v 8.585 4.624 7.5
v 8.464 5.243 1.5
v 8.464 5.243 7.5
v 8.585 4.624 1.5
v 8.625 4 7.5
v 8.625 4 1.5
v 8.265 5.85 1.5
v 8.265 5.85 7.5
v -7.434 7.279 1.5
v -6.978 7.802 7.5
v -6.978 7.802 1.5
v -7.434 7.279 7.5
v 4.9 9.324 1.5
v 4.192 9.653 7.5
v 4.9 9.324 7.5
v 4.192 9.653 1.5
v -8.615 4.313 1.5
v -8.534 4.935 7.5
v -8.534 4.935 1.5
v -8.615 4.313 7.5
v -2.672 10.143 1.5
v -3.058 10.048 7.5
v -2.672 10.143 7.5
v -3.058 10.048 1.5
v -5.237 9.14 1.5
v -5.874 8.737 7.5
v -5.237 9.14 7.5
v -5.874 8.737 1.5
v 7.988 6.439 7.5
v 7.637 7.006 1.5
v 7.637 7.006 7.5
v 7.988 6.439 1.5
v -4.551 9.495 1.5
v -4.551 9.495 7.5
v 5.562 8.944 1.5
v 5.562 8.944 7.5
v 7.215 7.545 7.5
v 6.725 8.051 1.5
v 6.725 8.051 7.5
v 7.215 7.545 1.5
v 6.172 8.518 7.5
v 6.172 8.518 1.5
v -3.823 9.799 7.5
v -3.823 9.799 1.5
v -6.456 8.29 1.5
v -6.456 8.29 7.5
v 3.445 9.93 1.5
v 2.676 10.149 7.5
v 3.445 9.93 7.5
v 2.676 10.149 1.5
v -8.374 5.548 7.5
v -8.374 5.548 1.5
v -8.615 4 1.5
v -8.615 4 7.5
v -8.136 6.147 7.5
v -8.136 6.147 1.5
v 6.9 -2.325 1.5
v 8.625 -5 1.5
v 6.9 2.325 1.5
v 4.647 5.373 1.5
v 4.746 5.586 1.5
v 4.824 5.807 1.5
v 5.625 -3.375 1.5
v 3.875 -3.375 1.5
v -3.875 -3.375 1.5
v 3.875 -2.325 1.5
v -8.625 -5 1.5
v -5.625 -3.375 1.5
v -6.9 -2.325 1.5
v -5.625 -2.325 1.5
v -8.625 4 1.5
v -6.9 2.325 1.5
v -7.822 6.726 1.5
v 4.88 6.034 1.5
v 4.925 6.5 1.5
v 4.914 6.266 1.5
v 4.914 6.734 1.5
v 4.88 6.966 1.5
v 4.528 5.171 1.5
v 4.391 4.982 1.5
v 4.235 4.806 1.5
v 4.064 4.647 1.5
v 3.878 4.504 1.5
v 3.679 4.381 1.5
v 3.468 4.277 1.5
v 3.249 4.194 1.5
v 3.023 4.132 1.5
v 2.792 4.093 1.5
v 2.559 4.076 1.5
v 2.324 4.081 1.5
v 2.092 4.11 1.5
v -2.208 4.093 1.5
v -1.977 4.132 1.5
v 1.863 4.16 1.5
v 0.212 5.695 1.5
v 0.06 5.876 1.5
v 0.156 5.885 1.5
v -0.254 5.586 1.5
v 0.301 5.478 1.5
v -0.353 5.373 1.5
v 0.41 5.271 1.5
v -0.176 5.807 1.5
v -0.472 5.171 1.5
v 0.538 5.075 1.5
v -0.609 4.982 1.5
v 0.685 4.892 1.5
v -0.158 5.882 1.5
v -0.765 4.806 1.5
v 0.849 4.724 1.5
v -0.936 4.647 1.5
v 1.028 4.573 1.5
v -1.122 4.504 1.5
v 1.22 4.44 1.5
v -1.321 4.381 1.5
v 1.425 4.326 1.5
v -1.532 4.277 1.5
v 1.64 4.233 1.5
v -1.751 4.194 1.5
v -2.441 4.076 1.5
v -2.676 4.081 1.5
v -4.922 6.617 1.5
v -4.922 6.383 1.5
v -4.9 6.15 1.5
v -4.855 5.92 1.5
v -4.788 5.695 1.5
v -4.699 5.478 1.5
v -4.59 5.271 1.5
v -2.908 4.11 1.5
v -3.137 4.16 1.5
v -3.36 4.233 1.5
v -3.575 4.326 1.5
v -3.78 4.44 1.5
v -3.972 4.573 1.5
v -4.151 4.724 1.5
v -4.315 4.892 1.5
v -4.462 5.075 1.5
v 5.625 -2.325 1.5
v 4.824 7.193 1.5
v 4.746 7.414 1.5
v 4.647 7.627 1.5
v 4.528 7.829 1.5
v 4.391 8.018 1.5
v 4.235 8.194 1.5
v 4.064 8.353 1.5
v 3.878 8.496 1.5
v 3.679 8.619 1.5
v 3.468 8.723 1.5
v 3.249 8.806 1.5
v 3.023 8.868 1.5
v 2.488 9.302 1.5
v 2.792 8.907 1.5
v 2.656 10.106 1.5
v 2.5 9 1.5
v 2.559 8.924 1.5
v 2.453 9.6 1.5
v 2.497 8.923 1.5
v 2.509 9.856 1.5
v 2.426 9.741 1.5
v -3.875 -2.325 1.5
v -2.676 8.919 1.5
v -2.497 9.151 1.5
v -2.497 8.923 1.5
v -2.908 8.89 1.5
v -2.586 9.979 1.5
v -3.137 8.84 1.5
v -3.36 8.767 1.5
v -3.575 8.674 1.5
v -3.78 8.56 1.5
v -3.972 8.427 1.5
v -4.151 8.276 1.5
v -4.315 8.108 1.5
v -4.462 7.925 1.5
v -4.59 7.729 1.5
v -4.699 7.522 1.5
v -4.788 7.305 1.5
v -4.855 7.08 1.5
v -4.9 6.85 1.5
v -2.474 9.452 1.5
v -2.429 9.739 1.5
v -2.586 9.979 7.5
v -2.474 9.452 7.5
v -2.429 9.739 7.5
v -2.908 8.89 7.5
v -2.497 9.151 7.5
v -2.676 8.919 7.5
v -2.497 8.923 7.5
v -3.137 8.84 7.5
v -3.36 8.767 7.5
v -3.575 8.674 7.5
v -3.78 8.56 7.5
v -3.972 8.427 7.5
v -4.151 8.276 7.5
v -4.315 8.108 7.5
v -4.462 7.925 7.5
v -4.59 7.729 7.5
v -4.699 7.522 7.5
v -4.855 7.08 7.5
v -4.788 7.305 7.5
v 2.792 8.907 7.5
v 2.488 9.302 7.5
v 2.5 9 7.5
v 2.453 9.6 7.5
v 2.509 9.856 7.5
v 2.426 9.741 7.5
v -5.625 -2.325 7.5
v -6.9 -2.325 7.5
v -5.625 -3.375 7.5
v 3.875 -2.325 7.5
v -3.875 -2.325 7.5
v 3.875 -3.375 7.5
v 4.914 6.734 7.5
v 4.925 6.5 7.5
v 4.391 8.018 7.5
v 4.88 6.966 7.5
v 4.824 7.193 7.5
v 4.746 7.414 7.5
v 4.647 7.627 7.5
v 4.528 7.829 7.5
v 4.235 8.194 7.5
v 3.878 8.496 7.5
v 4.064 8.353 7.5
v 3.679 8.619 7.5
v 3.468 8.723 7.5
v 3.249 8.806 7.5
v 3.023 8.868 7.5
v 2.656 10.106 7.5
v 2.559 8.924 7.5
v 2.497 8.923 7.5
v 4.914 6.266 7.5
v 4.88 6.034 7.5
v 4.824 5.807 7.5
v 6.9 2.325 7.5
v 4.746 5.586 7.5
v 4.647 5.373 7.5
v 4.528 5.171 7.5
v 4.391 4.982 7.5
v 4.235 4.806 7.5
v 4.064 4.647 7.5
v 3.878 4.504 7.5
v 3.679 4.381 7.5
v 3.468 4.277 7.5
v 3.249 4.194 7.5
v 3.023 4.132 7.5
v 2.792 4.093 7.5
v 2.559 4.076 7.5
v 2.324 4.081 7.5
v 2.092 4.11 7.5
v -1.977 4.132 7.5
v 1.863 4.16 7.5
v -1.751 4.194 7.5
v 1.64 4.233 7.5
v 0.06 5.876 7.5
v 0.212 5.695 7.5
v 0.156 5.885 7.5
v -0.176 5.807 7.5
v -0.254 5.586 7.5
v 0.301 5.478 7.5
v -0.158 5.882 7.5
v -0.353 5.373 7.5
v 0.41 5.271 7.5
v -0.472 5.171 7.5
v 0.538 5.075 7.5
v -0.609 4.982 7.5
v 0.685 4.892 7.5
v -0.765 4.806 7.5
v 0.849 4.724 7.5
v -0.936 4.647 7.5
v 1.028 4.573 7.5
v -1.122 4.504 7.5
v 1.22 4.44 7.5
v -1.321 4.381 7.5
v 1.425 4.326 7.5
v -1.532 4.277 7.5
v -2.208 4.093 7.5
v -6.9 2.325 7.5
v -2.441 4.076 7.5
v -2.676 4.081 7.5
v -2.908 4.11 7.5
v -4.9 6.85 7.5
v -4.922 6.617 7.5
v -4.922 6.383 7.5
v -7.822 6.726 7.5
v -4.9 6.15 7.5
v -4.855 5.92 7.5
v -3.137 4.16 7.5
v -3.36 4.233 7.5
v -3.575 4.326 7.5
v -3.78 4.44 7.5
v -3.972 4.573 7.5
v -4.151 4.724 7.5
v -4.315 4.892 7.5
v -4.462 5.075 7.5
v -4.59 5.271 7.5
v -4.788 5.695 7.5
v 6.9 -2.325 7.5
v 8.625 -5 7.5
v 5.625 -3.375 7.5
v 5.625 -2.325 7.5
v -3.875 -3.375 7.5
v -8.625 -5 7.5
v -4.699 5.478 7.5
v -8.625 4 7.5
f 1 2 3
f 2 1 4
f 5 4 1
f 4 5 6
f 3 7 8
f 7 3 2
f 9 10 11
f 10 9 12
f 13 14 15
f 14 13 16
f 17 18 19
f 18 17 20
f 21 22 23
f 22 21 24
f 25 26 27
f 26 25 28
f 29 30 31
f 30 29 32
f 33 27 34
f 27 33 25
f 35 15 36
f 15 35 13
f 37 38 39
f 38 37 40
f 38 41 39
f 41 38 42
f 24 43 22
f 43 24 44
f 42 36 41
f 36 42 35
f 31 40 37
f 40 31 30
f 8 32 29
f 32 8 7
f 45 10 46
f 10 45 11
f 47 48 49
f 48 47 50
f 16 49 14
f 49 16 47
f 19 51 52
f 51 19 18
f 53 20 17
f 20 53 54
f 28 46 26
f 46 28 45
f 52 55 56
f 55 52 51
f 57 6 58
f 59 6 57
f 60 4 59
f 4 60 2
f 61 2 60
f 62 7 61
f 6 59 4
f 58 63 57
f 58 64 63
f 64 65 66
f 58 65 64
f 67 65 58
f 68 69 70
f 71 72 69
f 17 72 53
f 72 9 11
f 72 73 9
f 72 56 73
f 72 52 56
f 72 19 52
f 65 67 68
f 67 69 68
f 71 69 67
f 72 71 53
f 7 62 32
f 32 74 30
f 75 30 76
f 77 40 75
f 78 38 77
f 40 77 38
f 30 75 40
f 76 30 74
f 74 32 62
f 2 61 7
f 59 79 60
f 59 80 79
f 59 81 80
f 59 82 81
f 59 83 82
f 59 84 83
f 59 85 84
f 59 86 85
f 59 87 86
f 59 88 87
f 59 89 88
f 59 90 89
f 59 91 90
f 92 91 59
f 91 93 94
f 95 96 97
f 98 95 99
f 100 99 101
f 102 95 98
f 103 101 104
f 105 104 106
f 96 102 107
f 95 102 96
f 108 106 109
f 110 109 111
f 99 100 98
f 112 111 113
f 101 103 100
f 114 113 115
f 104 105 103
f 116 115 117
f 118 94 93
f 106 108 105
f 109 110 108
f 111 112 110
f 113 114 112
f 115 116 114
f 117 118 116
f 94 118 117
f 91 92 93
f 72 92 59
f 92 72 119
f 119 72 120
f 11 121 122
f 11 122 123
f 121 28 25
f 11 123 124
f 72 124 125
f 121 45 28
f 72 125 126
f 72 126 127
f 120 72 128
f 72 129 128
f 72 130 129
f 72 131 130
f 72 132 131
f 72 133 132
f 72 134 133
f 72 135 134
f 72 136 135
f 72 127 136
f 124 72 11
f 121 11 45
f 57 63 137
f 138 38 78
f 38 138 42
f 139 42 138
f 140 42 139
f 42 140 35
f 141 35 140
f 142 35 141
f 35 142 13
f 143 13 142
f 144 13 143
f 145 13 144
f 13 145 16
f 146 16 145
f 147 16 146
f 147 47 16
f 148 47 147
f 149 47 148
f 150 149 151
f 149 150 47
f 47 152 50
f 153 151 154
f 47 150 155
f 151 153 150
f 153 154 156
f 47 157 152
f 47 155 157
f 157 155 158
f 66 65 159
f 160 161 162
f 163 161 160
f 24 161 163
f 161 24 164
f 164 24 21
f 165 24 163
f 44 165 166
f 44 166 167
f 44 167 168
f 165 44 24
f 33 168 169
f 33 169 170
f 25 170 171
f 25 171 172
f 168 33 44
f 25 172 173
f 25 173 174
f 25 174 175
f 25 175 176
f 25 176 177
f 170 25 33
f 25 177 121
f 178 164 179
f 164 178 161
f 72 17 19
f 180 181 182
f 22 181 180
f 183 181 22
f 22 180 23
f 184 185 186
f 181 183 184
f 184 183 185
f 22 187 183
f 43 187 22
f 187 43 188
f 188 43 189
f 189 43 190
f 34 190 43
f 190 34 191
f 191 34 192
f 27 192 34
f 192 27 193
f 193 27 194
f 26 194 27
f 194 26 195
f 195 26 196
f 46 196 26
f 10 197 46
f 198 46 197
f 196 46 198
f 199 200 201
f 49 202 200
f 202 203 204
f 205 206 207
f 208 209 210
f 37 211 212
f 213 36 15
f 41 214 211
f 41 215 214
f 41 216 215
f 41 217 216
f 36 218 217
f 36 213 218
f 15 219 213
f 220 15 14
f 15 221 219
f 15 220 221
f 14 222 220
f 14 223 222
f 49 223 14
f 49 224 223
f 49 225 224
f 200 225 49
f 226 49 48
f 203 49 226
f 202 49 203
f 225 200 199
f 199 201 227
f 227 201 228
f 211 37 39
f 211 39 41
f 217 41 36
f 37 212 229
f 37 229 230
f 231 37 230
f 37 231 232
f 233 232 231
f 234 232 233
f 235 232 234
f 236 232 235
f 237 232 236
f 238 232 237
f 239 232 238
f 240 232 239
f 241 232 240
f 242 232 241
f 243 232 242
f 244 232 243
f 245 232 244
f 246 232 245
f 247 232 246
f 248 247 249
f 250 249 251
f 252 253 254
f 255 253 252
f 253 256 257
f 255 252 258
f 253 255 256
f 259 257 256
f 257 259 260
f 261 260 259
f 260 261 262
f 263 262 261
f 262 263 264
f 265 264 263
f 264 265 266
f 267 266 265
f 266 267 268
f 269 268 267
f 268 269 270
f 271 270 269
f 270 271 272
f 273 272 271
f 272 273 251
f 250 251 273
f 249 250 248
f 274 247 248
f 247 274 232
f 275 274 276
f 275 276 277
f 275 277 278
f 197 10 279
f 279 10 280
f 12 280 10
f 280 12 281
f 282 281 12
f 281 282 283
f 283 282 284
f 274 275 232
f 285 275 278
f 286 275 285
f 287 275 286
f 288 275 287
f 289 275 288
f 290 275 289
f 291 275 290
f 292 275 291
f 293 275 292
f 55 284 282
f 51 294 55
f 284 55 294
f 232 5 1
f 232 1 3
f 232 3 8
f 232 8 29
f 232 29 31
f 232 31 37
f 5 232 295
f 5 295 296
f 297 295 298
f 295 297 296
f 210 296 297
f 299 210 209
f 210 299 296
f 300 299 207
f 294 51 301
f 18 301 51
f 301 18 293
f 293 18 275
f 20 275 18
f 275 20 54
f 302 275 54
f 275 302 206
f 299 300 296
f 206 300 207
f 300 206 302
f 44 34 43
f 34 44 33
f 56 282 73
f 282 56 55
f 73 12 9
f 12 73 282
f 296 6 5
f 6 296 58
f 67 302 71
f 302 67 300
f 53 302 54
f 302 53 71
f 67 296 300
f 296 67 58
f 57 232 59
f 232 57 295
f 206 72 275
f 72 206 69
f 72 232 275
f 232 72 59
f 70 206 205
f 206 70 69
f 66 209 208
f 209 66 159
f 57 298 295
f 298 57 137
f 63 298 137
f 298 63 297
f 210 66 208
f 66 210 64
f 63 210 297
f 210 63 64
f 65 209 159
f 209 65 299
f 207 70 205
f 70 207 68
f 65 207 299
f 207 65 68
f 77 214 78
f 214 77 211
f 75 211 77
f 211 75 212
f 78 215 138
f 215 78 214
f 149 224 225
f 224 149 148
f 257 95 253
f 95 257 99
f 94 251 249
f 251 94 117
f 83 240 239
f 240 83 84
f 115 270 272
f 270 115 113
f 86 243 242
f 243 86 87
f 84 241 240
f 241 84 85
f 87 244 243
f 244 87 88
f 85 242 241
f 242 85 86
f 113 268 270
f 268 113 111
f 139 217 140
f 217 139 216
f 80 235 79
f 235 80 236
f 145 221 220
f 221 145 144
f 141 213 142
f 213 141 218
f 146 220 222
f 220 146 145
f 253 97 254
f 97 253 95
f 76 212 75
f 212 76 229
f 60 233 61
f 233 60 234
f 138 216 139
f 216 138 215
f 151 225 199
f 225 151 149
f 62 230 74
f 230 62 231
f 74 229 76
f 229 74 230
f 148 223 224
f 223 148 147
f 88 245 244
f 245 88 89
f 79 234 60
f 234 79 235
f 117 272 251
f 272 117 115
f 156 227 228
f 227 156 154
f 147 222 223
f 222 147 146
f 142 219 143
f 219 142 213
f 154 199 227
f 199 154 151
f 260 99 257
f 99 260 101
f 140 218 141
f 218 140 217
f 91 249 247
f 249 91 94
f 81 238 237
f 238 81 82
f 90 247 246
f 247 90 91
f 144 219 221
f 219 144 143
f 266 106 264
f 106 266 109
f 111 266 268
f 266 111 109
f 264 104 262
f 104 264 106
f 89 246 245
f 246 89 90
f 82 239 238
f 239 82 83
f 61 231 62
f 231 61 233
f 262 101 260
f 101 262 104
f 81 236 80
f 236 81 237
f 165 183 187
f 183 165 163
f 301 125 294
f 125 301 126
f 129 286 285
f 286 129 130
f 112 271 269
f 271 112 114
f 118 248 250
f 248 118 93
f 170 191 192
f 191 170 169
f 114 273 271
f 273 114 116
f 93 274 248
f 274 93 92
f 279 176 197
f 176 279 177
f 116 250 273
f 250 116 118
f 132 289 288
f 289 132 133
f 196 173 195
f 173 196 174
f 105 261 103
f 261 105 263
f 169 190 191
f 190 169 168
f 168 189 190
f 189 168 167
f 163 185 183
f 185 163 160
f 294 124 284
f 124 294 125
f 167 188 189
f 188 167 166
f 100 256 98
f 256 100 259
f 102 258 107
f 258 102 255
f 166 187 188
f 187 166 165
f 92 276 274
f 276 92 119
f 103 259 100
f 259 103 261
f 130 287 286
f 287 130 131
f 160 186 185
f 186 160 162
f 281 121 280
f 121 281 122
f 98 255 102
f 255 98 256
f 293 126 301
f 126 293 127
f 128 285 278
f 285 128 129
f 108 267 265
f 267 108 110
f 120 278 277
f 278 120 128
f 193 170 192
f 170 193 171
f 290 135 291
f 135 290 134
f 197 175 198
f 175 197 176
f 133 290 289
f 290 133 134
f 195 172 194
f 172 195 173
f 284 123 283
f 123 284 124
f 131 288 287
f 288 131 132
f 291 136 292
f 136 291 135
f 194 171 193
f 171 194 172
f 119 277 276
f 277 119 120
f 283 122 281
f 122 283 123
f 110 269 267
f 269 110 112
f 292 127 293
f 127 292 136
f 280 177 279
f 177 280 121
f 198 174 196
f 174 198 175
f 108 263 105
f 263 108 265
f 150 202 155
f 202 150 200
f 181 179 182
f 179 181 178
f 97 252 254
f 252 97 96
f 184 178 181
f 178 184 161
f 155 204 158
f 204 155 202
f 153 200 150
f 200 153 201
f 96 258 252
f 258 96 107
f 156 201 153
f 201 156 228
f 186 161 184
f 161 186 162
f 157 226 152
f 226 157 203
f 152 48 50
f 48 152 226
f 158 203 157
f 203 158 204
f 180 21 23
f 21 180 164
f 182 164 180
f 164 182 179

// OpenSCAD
cell_count = 4; // 3=3S, 4=4S, etc.

$fn=65;

show = "all"; // "all", "body", "jst", "holes", "cutout"

difference() {

    // body
    if (show=="body" || show=="all") {
        translate([0,0,0]) {
            translate([0,-0.5,4.5])
                cube([17.25,9,6], true);
            
            difference() {
                translate([0,4,4.5])
                    scale([1,0.75,1]) cylinder(h=6, d=17.25, center=true);
                translate([0,-17.25/2,4.5])
                    cube([17.25,17.25,6], true);
            }
            
        }
    }

    // JST-XH 5 (4S)
    if (show=="jst" || show=="all") {
        union() {
            translate([0,0,4.25])
                cube([13.8,4.65,8], true);

            translate([0,0.5,0.5])
                cube([15,5,1],true);

            translate([0,-2.5,0.5])    
                cube([10,1,1], true);

            translate([4.75,-2.75,2.5])    
                cube([1.75,1.25,10], true);
                
            translate([-4.75,-2.75,2.5])    
                cube([1.75,1.25,10], true);

        }
    }

    // Wire holes
    if (show=="holes" || show=="all") {
        translate([2.5,6.5,5]) 
            cylinder(d=4.85, h=8, center=true);

        translate([-2.5,6.5,5]) 
            cylinder(d=4.85, h=8, center=true);
    }

    if (show=="cutout" || show=="all") {
        // Cutout
        translate([0,11.5,4.5]) {
            difference() {
                cylinder(d=20,h=8, center=true);
                
                translate([5,-5.5,0])
                    cylinder(d=10,h=8,center=true);
                translate([-5,-5.5,0])
                    cylinder(d=10,h=8,center=true);
                
                translate([0,-5,0])
                    cube([10,10,10], true);


            }
            
            translate([0,-2.5,0])
            scale([1,1.25,1])
            cylinder(d=5,h=8,center=true);
            
            translate([0,0,0])
                cylinder(d=6,h=8,center=true);
            
            /*
            difference() {
                translate([0,-12,0])
                    rotate([0,0,45])
                        cube([12,12,8], true);
                
                translate([0,-2,0])
                    cube([10,5,8], true);
                
                translate([0,-16,0])
                    cube([20,20,8], true);
            }
            */

        }
    }

}
